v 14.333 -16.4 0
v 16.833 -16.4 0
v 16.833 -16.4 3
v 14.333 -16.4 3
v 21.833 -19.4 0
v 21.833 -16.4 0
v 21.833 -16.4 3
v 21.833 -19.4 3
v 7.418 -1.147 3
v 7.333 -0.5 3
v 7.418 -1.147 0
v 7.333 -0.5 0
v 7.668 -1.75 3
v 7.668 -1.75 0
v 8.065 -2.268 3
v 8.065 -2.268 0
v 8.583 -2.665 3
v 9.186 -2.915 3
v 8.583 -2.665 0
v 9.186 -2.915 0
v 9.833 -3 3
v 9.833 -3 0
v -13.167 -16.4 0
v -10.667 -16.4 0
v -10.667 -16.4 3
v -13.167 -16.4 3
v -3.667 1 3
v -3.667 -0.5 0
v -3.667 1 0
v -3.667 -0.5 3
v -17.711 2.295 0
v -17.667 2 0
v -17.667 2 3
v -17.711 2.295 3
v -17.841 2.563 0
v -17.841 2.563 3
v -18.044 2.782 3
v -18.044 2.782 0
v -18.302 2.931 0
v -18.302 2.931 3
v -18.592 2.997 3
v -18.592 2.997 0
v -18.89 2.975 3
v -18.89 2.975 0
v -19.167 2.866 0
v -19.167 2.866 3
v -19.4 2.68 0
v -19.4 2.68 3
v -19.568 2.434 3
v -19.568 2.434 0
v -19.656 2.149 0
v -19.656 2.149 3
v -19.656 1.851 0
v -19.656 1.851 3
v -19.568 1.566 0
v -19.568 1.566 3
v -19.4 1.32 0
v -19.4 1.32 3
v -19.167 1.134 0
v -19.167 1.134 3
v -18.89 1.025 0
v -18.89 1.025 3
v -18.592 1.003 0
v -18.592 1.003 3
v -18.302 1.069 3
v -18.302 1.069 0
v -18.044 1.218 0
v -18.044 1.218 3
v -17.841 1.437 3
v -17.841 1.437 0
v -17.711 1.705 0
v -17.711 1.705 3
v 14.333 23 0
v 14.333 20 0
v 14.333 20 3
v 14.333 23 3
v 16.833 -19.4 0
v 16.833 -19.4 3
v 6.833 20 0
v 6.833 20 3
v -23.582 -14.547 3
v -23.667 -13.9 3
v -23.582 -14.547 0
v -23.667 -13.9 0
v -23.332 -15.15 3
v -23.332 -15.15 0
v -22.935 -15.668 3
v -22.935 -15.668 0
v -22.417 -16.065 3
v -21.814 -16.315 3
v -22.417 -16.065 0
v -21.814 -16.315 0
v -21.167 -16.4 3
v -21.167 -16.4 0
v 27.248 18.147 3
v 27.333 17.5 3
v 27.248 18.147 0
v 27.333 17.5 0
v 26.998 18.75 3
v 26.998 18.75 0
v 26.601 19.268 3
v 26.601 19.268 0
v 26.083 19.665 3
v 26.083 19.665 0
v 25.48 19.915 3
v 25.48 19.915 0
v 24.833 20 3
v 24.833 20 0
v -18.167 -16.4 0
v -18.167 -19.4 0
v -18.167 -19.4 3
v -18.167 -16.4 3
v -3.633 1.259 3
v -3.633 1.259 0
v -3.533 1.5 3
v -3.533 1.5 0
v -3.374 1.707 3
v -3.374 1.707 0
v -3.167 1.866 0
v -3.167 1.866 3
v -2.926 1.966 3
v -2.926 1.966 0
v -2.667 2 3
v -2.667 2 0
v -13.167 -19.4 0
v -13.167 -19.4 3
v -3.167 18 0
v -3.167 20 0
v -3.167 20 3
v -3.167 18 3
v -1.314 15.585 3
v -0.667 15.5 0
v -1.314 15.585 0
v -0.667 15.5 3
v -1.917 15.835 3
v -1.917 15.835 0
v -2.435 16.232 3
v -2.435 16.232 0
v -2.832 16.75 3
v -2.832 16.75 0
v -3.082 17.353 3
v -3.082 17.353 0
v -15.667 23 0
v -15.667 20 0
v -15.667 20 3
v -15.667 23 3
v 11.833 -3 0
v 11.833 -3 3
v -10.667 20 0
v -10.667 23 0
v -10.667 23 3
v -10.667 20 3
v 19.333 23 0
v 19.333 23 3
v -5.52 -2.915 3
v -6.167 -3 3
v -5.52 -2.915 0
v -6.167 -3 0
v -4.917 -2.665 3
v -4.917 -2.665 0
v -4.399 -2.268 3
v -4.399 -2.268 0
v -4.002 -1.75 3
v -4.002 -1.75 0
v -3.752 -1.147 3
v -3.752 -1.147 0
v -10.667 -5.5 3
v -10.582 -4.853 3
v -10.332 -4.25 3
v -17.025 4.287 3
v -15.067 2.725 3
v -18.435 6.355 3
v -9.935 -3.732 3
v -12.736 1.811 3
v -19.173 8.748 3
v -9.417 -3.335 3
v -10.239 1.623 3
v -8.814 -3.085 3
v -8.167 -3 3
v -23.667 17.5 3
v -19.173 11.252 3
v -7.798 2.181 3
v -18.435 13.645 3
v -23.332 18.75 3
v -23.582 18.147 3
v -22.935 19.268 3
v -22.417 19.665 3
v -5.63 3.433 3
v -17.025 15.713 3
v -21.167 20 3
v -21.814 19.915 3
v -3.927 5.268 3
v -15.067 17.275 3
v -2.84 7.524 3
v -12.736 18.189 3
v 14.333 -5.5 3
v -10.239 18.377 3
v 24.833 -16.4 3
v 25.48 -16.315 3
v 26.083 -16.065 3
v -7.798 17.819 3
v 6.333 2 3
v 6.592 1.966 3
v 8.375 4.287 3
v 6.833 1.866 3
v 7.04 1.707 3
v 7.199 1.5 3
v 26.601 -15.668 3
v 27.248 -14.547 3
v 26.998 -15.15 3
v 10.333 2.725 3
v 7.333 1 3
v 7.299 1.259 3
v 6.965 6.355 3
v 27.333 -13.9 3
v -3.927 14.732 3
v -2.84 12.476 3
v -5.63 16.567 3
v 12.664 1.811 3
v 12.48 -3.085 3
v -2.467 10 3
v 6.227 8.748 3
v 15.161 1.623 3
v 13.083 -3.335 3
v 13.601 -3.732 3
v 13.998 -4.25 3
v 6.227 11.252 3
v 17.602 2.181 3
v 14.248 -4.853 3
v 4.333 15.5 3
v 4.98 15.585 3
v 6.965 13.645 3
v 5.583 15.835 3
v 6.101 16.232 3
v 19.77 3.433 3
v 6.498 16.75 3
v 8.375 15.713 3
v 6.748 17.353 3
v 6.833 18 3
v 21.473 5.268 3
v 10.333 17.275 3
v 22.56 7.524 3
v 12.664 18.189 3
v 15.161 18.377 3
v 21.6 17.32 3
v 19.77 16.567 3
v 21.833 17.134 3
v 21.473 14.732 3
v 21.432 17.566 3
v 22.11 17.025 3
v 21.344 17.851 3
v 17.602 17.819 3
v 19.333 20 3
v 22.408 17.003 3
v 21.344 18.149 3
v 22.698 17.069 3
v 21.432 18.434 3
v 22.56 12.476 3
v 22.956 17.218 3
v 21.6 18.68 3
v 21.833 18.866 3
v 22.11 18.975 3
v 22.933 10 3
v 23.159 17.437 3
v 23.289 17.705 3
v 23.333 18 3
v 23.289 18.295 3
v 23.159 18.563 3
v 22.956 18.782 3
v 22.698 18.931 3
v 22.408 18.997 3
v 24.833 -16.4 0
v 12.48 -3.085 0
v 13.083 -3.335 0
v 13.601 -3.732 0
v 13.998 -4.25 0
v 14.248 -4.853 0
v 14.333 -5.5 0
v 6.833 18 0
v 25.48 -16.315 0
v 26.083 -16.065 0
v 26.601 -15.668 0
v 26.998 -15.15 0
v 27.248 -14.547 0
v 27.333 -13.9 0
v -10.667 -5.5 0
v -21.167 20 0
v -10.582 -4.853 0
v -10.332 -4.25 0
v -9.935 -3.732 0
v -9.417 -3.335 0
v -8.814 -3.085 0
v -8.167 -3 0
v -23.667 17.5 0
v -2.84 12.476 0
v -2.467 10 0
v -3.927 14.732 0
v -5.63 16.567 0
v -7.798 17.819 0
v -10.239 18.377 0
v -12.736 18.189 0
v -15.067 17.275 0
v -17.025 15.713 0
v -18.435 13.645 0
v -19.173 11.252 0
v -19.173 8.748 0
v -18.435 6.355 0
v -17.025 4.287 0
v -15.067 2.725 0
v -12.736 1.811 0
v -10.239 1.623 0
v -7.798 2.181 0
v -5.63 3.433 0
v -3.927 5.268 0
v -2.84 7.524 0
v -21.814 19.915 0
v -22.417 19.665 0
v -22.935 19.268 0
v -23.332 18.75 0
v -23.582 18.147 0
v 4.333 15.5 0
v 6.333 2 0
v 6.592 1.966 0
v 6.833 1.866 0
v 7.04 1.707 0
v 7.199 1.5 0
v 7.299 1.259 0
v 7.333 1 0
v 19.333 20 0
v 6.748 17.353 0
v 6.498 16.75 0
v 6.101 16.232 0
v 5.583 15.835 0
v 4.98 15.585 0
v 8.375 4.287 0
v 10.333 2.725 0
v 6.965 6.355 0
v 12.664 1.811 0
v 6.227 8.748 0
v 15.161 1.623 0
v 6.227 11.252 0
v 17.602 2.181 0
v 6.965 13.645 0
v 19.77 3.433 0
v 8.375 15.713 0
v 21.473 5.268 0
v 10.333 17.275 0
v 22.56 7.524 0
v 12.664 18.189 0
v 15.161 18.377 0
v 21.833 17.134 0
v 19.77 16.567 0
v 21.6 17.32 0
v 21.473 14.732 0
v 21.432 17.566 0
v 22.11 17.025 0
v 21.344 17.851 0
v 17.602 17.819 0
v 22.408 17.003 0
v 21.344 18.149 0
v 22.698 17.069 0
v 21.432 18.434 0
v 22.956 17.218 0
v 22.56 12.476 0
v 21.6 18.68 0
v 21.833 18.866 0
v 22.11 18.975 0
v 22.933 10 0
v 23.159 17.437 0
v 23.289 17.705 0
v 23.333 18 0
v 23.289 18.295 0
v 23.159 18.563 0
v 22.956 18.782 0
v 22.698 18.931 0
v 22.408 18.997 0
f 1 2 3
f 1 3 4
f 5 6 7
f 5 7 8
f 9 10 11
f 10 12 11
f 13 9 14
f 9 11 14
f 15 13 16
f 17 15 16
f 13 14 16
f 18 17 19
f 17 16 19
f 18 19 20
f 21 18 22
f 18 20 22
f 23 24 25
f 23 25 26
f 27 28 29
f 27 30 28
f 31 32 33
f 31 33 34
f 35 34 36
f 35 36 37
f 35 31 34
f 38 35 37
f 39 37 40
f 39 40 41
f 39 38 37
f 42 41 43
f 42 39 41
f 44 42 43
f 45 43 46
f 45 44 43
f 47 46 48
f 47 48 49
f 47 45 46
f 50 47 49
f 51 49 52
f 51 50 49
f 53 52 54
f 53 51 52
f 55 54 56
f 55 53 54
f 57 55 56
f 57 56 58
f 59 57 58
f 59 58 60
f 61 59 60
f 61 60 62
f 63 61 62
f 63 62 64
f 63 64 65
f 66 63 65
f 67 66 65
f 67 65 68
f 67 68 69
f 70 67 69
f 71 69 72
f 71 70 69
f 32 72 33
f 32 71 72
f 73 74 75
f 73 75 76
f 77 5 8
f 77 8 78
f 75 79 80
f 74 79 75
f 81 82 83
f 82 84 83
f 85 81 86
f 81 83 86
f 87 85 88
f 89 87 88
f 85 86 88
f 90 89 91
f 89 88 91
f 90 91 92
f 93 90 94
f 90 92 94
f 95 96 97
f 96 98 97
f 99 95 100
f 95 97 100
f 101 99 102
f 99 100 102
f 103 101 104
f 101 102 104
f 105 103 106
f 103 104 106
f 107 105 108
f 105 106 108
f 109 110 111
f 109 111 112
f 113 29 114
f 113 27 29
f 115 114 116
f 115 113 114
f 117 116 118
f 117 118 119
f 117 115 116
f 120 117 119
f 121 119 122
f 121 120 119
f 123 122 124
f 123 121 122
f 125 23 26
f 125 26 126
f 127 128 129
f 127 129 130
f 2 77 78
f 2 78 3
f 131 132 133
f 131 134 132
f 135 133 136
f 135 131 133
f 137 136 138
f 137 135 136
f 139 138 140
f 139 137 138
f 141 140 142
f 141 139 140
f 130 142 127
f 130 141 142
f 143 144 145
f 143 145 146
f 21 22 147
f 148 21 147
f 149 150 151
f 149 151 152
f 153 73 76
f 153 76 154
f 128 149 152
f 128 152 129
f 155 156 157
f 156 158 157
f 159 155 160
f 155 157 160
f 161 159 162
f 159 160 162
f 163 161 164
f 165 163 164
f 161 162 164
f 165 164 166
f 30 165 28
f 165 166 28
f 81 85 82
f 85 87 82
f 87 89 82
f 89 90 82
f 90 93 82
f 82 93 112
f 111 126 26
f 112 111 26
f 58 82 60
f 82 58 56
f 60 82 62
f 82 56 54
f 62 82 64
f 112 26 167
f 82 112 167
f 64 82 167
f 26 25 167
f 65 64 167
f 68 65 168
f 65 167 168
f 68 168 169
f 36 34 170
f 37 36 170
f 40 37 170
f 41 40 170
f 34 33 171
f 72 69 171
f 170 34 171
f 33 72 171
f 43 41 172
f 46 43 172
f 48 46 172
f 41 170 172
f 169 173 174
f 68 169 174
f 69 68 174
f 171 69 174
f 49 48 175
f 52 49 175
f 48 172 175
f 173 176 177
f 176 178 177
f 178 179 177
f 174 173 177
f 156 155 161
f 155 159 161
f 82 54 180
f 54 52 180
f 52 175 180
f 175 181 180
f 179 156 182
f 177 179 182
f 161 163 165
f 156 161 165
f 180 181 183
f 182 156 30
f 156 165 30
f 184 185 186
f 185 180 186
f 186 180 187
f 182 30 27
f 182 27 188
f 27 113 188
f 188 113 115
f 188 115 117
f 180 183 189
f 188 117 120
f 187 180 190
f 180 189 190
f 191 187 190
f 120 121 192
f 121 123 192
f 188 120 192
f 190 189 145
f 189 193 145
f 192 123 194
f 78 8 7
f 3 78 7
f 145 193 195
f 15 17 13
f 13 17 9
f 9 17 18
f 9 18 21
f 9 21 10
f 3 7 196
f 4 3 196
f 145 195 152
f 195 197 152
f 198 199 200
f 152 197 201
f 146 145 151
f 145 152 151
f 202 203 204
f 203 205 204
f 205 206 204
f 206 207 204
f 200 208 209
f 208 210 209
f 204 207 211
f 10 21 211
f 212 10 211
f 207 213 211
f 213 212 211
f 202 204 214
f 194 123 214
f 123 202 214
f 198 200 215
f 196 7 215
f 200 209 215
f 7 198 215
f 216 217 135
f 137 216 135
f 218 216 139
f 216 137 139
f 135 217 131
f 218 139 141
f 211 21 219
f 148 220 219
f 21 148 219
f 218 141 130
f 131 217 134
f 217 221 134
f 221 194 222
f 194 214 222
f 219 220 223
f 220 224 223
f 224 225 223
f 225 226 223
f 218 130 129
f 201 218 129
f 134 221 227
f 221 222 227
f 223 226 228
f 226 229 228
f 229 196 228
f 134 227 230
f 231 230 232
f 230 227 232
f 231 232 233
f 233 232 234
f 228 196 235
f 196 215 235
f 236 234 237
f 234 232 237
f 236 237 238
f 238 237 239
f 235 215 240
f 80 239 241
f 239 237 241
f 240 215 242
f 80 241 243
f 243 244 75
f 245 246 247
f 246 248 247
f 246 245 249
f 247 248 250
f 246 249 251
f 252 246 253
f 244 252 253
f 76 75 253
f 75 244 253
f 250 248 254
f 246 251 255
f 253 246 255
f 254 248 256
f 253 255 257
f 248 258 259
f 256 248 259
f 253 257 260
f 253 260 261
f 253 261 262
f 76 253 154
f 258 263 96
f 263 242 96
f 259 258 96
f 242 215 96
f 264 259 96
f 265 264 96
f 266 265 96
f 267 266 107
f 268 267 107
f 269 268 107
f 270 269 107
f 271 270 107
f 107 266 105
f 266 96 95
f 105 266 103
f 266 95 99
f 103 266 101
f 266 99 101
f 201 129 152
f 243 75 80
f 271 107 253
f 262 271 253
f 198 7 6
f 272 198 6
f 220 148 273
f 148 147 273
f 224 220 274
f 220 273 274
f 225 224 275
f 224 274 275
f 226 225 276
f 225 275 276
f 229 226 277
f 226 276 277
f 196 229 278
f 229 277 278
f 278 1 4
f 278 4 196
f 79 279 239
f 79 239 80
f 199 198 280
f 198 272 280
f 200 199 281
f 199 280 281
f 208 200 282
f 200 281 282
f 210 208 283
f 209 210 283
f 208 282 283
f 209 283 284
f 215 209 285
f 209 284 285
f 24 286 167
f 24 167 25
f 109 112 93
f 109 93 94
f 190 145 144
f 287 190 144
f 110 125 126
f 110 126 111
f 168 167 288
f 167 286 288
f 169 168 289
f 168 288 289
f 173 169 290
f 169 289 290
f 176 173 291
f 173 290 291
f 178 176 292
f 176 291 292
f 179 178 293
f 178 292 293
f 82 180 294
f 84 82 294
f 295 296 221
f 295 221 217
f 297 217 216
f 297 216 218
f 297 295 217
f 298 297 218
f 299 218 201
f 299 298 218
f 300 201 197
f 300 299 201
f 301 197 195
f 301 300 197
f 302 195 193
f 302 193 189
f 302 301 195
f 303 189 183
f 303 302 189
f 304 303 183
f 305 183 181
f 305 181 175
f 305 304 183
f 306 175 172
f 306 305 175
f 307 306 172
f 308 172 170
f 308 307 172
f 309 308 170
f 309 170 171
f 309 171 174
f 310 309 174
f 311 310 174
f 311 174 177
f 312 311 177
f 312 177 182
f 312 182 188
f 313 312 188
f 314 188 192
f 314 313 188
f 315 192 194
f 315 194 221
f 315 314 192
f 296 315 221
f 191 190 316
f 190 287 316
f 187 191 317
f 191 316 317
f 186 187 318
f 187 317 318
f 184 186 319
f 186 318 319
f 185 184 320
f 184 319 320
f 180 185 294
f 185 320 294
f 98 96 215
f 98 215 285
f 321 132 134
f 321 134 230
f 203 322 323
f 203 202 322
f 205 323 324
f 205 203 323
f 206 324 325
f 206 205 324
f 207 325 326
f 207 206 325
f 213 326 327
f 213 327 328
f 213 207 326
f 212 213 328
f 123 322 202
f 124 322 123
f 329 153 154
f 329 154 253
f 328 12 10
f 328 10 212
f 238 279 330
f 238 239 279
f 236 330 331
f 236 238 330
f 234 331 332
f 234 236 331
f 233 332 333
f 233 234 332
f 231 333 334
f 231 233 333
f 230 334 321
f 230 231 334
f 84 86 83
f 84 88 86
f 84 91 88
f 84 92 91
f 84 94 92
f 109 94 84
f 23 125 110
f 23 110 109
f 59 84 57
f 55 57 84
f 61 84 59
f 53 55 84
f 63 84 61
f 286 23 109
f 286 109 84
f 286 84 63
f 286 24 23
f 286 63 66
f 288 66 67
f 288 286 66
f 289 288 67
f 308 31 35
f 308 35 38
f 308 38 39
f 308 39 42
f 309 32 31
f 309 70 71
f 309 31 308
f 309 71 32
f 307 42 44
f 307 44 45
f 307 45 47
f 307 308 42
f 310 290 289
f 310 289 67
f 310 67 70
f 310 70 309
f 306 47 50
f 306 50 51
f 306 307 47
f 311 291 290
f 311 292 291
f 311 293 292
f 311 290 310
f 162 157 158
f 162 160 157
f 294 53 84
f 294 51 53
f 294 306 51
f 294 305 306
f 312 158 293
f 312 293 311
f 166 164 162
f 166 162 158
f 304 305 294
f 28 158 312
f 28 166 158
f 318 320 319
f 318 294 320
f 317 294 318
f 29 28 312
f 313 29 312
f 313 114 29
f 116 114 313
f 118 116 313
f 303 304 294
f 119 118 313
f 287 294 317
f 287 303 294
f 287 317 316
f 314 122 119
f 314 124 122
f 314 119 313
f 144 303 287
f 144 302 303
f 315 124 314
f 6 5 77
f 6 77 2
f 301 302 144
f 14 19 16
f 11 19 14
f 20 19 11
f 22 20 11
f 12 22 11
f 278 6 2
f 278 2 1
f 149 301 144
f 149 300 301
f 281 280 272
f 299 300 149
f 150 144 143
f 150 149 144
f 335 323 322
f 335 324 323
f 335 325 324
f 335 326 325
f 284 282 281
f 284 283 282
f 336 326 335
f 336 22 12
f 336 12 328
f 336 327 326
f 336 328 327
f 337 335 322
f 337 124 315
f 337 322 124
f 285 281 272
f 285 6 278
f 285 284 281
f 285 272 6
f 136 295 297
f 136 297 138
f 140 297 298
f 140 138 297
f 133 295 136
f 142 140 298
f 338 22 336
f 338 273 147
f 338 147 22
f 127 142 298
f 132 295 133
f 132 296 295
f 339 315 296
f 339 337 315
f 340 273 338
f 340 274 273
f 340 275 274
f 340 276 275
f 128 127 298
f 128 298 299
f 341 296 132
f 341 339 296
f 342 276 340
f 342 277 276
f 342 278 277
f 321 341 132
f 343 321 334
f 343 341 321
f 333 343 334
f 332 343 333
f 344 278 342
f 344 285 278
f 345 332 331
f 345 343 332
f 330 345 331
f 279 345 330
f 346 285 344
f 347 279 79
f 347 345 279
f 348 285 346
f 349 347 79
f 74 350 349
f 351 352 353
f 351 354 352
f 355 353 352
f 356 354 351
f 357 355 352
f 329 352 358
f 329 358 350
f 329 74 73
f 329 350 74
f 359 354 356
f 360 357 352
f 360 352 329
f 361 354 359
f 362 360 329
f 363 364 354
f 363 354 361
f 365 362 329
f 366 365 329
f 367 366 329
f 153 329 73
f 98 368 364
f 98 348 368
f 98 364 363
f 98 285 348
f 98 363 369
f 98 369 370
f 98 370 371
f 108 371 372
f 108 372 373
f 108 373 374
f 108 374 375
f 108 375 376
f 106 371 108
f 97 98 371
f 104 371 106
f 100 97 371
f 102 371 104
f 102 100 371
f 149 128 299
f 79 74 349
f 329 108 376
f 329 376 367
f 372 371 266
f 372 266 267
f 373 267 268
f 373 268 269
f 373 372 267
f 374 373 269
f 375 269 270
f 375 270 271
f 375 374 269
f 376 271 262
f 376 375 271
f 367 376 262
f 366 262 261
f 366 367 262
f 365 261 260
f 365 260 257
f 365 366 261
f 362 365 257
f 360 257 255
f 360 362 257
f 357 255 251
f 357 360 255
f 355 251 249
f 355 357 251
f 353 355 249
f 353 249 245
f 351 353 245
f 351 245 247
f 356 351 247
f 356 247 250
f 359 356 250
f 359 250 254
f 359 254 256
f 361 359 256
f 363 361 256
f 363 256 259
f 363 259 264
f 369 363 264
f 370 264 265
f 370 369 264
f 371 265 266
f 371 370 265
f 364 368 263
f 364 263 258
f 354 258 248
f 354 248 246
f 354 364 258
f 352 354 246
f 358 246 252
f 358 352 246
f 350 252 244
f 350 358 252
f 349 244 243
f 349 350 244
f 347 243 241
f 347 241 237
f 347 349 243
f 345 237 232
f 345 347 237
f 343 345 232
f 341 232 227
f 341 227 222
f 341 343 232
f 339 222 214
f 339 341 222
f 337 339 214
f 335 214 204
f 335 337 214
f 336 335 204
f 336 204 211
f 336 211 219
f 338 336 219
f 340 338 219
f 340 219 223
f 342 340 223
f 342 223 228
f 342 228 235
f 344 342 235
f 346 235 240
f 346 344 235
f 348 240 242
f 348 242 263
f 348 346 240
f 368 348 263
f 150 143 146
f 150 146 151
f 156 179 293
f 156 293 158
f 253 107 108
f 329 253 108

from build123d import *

# Parameters (mm, degrees)
SKETCH1_R           = 1
SKETCH1_R_2         = 8.4
BOSS_EXTRUDE1_DEPTH = 3
SKETCH2_W           = 7
SKETCH2_H           = 4
BOSS_EXTRUDE2_DEPTH = 3
SKETCH5_W           = 3
SKETCH5_H           = 36.4
BOSS_EXTRUDE3_DEPTH = 3
FILLET2_R           = 2.5
FILLET3_R           = 1


with BuildPart() as part:
    # Sketch1 → Boss-Extrude1 (new body)
    with BuildSketch(Plane.XY):
        with BuildLine():
            Line((-20.667019059, -16.4), (-20.667019059, 20))
            Line((-20.667019059, 20), (-15.667019059, 20))
            Line((-15.667019059, 20), (-15.667019059, 23))
            Line((-15.667019059, 23), (-10.667019059, 23))
            Line((-10.667019059, 23), (-10.667019059, 20))
            Line((-10.667019059, 20), (-3.167019059, 20))
            Line((-3.167019059, 20), (-3.167019059, 15.5))
            Line((-3.167019059, 15.5), (6.832980941, 15.5))
            Line((6.832980941, 15.5), (6.832980941, 20))
            Line((6.832980941, 20), (14.332980941, 20))
            Line((14.332980941, 20), (14.332980941, 23))
            Line((14.332980941, 23), (19.332980941, 23))
            Line((19.332980941, 23), (19.332980941, 20))
            Line((19.332980941, 20), (24.332980941, 20))
            Line((24.332980941, 20), (24.332980941, -16.4))
            Line((24.332980941, -16.4), (21.832980941, -16.4))
            Line((21.832980941, -16.4), (21.832980941, -19.4))
            Line((21.832980941, -19.4), (16.832980941, -19.4))
            Line((16.832980941, -19.4), (16.832980941, -16.4))
            Line((16.832980941, -16.4), (14.332980941, -16.4))
            Line((14.332980941, -16.4), (14.332980941, -1))
            ThreePointArc((14.332980941, -1), (14.040087722, -0.292893219), (13.332980941, 0))
            Line((13.332980941, 0), (7.332980941, 0))
            Line((7.332980941, 0), (7.332980941, 2))
            Line((7.332980941, 2), (-3.667019059, 2))
            Line((-3.667019059, 2), (-3.667019059, 0))
            Line((-3.667019059, 0), (-9.667019059, 0))
            ThreePointArc((-9.667019059, 0), (-10.37412584, -0.292893219), (-10.667019059, -1))
            Line((-10.667019059, -1), (-10.667019059, -16.4))
            Line((-10.667019059, -16.4), (-13.167019059, -16.4))
            Line((-13.167019059, -16.4), (-13.167019059, -19.4))
            Line((-13.167019059, -19.4), (-18.167019059, -19.4))
            Line((-18.167019059, -19.4), (-18.167019059, -16.4))
            Line((-18.167019059, -16.4), (-20.667019059, -16.4))
        make_face()
        with Locations((22.332980941, 18)):
            Circle(SKETCH1_R, mode=Mode.SUBTRACT)
        with Locations((-18.667019059, 2)):
            Circle(SKETCH1_R, mode=Mode.SUBTRACT)
        with Locations((-10.867019059, 10)):
            Circle(SKETCH1_R_2, mode=Mode.SUBTRACT)
        with Locations((14.532980941, 10)):
            Circle(SKETCH1_R_2, mode=Mode.SUBTRACT)
    extrude(amount=BOSS_EXTRUDE1_DEPTH)

    # Sketch2 → Boss-Extrude2 (add)
    with BuildSketch(Plane.XY.offset(3)):
        with Locations((-7.167019059, -1)):
            Rectangle(SKETCH2_W, SKETCH2_H)
        with Locations((10.832980941, -1)):
            Rectangle(SKETCH2_W, SKETCH2_H)
    extrude(amount=-BOSS_EXTRUDE2_DEPTH)

    # Sketch5 → Boss-Extrude3 (add)
    with BuildSketch(Plane(origin=(24.332980941, 0, 0), x_dir=(0, 0, -1), z_dir=(1, 0, 0))):
        with Locations((-1.5, 1.8)):
            Rectangle(SKETCH5_W, SKETCH5_H)
    boss_extrude3 = extrude(amount=BOSS_EXTRUDE3_DEPTH)

    # Mirror1: Boss-Extrude3 across plane
    add(boss_extrude3.mirror(Plane(origin=(1.832980941, 0, 0), x_dir=(0, 0, 1), z_dir=(1, 0, 0))))

    # Fillet2
    fillet2_edges = [part.edges().sort_by_distance(p)[0] for p in [
        (-10.667019059, -3, 1.5),
        (-3.667019059, -3, 1.5),
        (7.332980941, -3, 1.5),
        (14.332980941, -3, 1.5),
        (27.332980941, -16.4, 1.5),
        (27.332980941, 20, 1.5),
        (-23.667019059, 20, 1.5),
        (-23.667019059, -16.4, 1.5),
        (-3.167019059, 15.5, 1.5),
        (6.832980941, 15.5, 1.5),
    ]]
    fillet(fillet2_edges, radius=FILLET2_R)

    # Fillet3
    fillet3_edges = [part.edges().sort_by_distance(p)[0] for p in [
        (7.332980941, 2, 1.5),
        (-3.667019059, 2, 1.5),
    ]]
    fillet(fillet3_edges, radius=FILLET3_R)


solid = part.part
